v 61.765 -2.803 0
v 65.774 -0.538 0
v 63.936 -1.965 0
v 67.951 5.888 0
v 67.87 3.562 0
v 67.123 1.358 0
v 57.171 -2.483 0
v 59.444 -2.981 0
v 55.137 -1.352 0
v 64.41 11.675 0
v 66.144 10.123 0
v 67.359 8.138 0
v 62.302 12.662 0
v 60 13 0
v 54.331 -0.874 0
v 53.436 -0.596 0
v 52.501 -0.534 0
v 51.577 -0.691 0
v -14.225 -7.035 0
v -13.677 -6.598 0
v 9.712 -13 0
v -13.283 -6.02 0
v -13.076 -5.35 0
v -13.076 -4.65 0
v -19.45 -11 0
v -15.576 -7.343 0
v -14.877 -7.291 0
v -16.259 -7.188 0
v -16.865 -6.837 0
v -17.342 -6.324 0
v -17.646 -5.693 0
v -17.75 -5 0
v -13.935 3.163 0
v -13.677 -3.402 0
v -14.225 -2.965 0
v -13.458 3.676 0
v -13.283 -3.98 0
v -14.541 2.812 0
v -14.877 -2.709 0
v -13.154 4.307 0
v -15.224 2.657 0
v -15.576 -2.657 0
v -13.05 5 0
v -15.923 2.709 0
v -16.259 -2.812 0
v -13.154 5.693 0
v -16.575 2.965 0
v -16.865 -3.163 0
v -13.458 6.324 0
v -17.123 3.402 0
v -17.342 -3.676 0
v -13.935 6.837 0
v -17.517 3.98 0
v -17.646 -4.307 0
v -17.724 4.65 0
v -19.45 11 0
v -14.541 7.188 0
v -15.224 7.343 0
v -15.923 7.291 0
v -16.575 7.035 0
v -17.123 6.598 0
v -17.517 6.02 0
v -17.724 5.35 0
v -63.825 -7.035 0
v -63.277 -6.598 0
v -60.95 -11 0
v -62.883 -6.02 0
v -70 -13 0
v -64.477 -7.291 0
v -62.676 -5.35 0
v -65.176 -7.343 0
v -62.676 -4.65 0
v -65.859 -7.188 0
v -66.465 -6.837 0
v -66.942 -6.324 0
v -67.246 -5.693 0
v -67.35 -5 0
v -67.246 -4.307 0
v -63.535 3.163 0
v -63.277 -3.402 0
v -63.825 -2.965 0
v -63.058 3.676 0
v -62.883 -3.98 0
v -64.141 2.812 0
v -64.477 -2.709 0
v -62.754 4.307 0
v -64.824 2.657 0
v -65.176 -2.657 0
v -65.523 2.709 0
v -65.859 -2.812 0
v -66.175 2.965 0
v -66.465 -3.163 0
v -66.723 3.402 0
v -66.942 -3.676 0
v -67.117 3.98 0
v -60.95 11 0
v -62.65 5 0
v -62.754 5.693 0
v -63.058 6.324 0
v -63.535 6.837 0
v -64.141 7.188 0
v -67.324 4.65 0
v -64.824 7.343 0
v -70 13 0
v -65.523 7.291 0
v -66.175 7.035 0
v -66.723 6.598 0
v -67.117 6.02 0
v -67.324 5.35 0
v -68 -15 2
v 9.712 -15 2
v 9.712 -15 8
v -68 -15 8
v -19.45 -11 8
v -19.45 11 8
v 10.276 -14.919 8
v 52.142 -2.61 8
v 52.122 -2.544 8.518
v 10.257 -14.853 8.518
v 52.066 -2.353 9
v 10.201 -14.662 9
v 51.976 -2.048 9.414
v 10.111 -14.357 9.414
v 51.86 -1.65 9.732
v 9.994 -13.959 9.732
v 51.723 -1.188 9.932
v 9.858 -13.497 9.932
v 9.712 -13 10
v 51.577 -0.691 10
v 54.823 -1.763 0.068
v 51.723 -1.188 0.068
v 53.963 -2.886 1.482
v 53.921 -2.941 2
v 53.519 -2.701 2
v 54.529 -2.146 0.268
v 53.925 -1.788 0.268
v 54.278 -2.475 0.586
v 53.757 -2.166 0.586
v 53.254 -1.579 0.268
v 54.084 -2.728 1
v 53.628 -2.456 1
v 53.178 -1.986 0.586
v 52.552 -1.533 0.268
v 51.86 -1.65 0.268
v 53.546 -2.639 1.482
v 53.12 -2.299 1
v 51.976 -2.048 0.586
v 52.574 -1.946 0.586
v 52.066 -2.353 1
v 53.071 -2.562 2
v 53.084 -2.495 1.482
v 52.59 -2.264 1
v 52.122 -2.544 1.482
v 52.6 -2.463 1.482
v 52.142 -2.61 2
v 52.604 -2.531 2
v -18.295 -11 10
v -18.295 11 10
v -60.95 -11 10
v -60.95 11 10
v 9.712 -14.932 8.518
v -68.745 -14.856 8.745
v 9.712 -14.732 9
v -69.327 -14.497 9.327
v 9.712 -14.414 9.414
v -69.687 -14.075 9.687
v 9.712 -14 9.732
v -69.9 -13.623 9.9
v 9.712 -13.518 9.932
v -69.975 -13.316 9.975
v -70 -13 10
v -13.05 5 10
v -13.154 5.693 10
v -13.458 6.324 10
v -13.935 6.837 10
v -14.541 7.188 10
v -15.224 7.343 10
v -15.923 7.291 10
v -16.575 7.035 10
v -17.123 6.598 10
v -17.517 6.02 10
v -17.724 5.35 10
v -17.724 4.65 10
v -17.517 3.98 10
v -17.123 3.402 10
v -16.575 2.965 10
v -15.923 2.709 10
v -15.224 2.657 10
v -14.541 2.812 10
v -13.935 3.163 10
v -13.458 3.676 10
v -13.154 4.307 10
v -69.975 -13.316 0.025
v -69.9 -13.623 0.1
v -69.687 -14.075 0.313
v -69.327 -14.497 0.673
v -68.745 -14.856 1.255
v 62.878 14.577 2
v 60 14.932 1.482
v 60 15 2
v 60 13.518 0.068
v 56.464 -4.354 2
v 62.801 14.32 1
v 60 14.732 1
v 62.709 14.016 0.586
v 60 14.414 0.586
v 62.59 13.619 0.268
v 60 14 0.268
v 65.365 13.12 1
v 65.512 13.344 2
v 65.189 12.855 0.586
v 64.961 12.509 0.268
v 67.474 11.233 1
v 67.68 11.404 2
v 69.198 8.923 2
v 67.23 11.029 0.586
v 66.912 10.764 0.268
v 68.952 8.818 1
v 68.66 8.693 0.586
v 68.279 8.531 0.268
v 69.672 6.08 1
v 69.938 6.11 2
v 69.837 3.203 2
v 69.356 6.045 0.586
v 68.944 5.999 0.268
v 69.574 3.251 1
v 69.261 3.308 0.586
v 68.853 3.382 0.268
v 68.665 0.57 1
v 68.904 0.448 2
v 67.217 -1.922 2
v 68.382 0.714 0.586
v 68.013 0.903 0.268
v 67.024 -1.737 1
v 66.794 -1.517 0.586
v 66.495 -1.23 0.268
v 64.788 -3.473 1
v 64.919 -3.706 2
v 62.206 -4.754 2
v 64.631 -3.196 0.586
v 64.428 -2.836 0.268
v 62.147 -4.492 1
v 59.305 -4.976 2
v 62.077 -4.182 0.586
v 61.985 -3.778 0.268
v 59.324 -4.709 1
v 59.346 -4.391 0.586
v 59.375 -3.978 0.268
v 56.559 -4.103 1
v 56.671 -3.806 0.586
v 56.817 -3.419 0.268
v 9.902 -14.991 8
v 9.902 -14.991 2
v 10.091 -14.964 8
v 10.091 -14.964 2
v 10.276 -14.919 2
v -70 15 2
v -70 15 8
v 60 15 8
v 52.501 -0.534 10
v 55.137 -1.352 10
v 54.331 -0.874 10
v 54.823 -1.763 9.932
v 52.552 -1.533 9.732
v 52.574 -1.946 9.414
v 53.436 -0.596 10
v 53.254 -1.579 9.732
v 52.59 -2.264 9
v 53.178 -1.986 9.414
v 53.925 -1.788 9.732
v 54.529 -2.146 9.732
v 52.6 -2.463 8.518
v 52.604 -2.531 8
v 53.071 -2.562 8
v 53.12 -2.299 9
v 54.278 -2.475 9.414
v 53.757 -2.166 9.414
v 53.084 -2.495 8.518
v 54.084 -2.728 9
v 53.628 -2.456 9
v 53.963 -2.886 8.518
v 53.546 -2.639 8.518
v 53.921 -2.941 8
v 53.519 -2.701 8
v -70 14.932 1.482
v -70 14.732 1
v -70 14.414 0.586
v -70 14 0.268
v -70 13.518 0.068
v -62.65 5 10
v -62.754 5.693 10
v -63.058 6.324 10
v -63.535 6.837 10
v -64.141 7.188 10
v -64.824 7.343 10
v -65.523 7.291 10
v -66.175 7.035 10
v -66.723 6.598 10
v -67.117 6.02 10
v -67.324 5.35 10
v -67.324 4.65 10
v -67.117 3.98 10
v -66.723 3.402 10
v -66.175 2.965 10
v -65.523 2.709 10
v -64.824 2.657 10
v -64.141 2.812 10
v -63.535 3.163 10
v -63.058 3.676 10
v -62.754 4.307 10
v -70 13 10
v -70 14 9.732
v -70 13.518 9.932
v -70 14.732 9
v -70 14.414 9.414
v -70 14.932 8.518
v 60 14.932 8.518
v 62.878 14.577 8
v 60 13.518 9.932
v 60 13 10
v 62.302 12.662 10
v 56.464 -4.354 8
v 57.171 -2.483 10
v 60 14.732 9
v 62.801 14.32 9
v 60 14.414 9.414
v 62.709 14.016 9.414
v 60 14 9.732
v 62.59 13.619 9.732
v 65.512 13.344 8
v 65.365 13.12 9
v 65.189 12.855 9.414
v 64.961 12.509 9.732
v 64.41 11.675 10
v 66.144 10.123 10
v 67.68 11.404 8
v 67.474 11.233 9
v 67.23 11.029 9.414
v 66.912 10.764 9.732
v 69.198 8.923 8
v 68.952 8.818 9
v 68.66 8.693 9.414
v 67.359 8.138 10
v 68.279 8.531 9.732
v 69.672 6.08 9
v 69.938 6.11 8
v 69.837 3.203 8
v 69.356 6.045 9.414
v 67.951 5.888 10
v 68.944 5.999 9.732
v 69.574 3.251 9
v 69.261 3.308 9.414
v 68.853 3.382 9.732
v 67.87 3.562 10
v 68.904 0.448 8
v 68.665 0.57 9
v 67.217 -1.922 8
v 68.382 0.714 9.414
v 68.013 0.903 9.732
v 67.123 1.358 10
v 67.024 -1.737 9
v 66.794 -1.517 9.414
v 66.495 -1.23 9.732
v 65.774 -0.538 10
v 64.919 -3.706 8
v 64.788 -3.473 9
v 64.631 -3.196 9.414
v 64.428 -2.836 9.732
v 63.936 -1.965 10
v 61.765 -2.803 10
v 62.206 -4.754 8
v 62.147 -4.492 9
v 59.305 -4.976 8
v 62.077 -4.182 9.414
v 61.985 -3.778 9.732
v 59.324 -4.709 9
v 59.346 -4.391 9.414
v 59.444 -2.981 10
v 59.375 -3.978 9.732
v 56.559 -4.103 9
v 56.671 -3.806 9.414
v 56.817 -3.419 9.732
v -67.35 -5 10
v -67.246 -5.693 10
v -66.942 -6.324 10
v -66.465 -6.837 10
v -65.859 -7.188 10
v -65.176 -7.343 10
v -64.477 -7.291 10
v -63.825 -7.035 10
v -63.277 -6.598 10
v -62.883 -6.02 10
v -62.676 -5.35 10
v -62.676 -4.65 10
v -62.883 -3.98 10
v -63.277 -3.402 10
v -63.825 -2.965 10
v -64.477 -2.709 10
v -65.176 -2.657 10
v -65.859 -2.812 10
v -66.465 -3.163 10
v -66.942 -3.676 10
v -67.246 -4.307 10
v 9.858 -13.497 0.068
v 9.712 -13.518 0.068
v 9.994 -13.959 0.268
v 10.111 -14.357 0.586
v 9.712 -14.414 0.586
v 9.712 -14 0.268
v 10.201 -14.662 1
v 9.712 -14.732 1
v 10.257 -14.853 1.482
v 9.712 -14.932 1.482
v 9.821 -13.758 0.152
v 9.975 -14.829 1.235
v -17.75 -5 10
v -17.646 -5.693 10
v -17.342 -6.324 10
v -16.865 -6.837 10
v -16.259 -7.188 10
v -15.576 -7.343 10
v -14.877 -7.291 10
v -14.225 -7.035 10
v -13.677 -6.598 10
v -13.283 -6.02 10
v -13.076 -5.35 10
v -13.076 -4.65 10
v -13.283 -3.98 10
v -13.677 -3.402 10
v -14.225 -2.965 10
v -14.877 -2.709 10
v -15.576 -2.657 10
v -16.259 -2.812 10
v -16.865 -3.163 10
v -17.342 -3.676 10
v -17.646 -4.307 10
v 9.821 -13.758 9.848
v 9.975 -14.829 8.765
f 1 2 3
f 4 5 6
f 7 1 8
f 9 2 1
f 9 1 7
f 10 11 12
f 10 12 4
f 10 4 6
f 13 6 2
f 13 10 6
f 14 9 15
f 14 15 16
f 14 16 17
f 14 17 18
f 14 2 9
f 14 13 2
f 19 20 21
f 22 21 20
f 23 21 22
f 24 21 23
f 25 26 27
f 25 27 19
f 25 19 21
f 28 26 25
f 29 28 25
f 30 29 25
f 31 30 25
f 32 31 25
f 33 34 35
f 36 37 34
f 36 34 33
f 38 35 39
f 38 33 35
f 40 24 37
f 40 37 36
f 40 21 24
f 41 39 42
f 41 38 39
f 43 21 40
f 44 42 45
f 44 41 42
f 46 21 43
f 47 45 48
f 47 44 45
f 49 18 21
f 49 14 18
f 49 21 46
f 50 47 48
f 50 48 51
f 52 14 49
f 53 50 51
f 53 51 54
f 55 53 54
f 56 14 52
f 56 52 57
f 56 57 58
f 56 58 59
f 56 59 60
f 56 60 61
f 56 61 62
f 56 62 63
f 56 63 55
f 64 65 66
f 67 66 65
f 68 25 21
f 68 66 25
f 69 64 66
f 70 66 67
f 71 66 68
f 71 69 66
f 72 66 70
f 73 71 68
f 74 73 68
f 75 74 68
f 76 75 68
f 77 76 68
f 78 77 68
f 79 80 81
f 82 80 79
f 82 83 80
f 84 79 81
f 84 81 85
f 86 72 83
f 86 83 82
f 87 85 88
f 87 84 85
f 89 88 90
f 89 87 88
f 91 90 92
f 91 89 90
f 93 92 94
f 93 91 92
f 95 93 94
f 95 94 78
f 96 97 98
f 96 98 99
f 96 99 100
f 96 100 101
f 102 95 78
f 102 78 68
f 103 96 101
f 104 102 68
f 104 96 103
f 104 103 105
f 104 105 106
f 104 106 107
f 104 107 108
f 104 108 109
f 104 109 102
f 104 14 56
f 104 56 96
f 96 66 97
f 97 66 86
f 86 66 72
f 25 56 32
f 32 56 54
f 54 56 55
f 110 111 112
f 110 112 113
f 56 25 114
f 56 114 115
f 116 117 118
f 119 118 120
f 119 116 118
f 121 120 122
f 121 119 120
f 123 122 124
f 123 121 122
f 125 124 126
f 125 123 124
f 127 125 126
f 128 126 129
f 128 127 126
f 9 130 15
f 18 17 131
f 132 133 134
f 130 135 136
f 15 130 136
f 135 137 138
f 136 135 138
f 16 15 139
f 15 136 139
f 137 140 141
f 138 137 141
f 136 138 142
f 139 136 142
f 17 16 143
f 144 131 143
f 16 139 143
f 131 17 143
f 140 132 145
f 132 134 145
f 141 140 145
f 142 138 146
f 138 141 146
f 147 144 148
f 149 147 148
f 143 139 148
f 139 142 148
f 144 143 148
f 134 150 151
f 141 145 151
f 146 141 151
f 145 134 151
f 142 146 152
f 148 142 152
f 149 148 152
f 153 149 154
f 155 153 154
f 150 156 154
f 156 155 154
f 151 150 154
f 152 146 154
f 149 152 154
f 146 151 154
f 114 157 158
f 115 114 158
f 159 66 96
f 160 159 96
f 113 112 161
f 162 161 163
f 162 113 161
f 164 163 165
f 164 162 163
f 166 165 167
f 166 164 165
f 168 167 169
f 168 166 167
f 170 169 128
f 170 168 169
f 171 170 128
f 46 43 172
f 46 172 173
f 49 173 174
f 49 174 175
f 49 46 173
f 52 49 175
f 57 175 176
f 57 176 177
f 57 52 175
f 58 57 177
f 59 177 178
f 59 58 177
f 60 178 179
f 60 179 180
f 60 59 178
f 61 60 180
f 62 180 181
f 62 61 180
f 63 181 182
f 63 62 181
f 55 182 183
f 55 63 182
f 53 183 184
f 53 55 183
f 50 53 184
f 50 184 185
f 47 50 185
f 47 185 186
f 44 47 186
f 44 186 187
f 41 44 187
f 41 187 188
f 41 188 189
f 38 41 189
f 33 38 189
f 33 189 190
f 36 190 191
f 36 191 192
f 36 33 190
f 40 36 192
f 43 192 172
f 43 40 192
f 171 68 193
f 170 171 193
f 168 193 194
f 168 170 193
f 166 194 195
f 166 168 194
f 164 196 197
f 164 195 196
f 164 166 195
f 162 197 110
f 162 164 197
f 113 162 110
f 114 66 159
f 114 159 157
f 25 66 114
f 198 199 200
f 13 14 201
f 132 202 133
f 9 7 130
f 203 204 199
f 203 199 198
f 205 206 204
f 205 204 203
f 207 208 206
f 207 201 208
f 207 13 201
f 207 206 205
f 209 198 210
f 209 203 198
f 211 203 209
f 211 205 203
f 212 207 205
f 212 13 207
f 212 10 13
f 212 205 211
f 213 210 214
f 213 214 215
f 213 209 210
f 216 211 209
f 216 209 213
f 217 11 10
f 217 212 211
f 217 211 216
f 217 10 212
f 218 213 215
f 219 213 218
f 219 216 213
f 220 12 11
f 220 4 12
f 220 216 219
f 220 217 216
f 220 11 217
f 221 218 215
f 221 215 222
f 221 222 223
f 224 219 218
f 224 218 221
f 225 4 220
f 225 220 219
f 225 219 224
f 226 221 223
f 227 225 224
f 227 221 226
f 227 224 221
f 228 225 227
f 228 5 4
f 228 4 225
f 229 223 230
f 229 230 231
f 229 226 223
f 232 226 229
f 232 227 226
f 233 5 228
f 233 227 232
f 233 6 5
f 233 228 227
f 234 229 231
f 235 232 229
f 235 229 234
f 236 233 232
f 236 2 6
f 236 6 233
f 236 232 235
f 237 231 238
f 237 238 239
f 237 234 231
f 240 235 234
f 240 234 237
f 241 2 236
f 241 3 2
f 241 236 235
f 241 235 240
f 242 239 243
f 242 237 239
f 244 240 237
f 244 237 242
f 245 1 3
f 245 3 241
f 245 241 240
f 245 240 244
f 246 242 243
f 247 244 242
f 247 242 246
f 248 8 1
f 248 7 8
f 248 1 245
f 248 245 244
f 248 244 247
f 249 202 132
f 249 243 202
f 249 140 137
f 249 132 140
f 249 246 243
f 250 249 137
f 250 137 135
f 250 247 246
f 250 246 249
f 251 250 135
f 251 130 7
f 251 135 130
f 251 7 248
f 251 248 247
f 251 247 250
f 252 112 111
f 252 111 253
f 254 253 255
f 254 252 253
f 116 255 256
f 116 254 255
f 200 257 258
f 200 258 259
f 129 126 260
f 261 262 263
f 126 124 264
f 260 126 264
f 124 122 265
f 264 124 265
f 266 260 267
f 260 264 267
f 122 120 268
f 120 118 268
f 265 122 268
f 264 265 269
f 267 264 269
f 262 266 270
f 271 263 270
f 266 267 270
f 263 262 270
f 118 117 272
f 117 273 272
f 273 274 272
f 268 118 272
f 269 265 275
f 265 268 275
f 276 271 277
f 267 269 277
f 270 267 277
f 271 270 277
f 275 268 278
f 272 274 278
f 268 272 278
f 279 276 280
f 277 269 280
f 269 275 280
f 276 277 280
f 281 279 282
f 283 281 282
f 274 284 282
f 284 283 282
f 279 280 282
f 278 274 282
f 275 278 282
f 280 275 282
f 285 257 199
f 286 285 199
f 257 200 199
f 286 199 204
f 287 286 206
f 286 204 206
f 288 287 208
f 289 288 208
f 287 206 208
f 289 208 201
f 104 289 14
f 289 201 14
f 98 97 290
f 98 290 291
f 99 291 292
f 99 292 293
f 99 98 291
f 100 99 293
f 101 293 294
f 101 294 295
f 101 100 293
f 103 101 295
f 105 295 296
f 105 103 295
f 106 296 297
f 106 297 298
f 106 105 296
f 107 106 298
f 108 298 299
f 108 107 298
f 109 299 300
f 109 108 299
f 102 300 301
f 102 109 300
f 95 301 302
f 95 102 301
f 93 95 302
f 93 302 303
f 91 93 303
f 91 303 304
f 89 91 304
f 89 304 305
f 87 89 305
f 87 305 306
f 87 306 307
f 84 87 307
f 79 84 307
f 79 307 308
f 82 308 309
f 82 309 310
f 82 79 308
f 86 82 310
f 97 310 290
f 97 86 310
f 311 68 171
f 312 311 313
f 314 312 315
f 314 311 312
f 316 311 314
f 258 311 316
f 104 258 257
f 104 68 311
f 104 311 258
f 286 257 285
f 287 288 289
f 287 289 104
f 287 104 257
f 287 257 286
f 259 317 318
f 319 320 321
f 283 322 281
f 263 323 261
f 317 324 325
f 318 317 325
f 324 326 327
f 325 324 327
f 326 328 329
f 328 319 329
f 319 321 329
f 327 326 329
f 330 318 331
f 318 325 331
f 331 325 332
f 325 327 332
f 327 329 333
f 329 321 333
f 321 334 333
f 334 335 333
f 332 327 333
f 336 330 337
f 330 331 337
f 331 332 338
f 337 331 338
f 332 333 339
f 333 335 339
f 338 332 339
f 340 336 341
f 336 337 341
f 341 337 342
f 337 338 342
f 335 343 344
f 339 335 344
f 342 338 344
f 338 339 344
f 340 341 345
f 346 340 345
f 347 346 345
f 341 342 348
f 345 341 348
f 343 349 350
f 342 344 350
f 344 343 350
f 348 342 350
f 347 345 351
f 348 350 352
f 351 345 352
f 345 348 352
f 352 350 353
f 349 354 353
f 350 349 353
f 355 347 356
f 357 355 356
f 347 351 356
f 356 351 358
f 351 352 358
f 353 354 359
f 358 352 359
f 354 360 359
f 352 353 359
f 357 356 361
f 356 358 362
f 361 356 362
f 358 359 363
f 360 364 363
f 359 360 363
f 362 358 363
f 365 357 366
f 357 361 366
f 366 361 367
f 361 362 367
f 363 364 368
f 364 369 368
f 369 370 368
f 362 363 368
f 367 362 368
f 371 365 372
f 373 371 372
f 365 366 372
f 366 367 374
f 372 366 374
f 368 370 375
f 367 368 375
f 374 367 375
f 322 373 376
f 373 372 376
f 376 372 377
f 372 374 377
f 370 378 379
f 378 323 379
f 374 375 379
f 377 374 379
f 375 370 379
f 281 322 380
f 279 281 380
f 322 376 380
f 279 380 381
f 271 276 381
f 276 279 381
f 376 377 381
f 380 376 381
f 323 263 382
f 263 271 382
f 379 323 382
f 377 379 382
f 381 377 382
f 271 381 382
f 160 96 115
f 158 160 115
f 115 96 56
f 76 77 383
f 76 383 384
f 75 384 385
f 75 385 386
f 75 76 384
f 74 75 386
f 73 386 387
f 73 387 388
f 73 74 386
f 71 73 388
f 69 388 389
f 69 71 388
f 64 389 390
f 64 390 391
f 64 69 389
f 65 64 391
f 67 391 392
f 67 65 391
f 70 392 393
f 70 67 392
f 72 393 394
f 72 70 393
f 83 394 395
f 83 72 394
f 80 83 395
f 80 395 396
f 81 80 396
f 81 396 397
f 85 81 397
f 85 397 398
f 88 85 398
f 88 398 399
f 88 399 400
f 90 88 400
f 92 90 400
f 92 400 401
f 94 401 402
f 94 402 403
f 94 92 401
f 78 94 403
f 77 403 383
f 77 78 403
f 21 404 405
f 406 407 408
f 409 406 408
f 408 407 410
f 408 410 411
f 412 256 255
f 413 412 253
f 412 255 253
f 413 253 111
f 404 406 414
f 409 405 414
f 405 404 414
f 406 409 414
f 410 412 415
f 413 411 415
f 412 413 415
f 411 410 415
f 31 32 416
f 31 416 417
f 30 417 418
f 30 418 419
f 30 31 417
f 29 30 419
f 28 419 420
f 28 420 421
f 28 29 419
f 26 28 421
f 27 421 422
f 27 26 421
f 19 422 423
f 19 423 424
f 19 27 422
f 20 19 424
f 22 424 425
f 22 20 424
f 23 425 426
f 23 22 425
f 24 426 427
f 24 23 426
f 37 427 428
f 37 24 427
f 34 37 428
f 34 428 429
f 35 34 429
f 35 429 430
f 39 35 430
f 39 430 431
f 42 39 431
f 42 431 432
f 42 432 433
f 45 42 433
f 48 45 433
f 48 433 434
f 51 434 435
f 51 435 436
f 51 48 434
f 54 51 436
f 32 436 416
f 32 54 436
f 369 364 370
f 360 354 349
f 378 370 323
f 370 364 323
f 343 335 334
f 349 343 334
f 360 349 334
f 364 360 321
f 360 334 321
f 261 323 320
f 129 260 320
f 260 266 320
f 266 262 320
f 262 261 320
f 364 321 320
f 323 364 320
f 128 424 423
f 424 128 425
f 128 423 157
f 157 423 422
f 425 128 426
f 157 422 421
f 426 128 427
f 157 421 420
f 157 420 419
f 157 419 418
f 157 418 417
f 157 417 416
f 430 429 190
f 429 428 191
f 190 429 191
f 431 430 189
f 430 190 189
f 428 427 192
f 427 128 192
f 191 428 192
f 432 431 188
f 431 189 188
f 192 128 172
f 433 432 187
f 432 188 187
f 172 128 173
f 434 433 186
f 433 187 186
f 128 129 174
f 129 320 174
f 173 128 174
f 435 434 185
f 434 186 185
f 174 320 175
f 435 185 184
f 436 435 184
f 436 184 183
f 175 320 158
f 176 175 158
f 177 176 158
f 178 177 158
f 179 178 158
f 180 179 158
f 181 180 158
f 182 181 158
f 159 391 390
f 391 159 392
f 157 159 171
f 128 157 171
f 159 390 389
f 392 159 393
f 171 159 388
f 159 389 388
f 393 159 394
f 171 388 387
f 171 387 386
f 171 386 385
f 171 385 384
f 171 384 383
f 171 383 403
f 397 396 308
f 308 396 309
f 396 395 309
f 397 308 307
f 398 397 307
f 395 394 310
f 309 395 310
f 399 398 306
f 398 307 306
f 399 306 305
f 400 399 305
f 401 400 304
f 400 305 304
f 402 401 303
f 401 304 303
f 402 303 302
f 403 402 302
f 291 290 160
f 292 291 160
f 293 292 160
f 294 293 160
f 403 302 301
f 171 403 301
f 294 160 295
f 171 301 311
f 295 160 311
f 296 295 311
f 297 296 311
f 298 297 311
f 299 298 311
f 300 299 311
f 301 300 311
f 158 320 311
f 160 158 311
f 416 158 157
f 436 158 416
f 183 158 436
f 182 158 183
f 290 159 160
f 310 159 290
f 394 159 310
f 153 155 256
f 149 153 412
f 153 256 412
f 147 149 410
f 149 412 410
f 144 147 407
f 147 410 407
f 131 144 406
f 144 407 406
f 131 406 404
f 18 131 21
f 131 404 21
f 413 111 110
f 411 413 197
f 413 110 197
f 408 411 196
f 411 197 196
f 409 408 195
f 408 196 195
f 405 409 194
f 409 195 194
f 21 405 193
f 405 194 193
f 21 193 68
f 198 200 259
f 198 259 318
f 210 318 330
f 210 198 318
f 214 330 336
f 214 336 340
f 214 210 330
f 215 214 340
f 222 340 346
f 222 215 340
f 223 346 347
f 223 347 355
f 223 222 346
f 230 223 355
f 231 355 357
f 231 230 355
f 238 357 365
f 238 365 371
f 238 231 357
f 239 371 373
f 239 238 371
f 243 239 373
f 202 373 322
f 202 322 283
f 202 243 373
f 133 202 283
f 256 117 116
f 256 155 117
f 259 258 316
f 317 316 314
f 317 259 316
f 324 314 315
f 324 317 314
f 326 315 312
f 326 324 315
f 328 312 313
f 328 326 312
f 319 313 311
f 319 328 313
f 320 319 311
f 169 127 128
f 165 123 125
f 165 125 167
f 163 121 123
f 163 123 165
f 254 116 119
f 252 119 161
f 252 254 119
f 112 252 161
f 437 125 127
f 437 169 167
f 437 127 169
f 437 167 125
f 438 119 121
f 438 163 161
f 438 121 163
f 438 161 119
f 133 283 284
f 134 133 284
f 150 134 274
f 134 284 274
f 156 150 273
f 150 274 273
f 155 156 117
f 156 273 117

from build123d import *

# Parameters (mm, degrees)
SKETCH1_R           = 2.35
SKETCH1_W           = 41.5
SKETCH1_H           = 22
BOSS_EXTRUDE1_DEPTH = 10
FILLET1_R           = 2
CHAMFER1_SIZE       = 2
CHAMFER1_SIZE2      = 1.154700538


with BuildPart() as part:
    # Sketch1 → Boss-Extrude1 (new body)
    with BuildSketch(Plane.XY):
        with BuildLine():
            Line((-70, 15), (60, 15))
            ThreePointArc((60, 15), (69.302333621, 1.330314836), (53.172672864, -2.306682159))
            Line((53.172672864, -2.306682159), (10, -15))
            Line((10, -15), (-70, -15))
            Line((-70, -15), (-70, 15))
        make_face()
        with Locations((-65, 5)):
            Circle(SKETCH1_R, mode=Mode.SUBTRACT)
        with Locations((-15.4, 5)):
            Circle(SKETCH1_R, mode=Mode.SUBTRACT)
        with Locations(Location((-15.4, -5, 0), (0, 0, 180))):
            Circle(SKETCH1_R, mode=Mode.SUBTRACT)
        with Locations(Location((-65, -5, 0), (0, 0, 180))):
            Circle(SKETCH1_R, mode=Mode.SUBTRACT)
        with Locations((-40.2, 0)):
            Rectangle(SKETCH1_W, SKETCH1_H, mode=Mode.SUBTRACT)
    extrude(amount=BOSS_EXTRUDE1_DEPTH)

    # Fillet1
    fillet1_edges = [part.edges().sort_by_distance(p)[0] for p in [
        (31.586336432, -8.653341079, 10),
        (69.302333621, 1.330314836, 10),
        (-5, 15, 10),
        (-5, 15, 0),
        (69.302333621, 1.330314836, 0),
        (31.586336432, -8.653341079, 0),
        (-30, -15, 0),
        (-30, -15, 10),
        (53.172672864, -2.306682159, 5),
        (10, -15, 5),
        (-70, -15, 5),
    ]]
    fillet(fillet1_edges, radius=FILLET1_R)

    # Chamfer1
    chamfer1_edges = [part.edges().sort_by_distance(p)[0] for p in [
        (-19.45, 0, 10),
    ]]
    chamfer1_side = [part.faces().sort_by_distance(p)[0] for p in [
        (-19.45, 0, 5),
    ]]
    chamfer(chamfer1_edges, length=CHAMFER1_SIZE, length2=CHAMFER1_SIZE2, reference=chamfer1_side[0])


solid = part.part
